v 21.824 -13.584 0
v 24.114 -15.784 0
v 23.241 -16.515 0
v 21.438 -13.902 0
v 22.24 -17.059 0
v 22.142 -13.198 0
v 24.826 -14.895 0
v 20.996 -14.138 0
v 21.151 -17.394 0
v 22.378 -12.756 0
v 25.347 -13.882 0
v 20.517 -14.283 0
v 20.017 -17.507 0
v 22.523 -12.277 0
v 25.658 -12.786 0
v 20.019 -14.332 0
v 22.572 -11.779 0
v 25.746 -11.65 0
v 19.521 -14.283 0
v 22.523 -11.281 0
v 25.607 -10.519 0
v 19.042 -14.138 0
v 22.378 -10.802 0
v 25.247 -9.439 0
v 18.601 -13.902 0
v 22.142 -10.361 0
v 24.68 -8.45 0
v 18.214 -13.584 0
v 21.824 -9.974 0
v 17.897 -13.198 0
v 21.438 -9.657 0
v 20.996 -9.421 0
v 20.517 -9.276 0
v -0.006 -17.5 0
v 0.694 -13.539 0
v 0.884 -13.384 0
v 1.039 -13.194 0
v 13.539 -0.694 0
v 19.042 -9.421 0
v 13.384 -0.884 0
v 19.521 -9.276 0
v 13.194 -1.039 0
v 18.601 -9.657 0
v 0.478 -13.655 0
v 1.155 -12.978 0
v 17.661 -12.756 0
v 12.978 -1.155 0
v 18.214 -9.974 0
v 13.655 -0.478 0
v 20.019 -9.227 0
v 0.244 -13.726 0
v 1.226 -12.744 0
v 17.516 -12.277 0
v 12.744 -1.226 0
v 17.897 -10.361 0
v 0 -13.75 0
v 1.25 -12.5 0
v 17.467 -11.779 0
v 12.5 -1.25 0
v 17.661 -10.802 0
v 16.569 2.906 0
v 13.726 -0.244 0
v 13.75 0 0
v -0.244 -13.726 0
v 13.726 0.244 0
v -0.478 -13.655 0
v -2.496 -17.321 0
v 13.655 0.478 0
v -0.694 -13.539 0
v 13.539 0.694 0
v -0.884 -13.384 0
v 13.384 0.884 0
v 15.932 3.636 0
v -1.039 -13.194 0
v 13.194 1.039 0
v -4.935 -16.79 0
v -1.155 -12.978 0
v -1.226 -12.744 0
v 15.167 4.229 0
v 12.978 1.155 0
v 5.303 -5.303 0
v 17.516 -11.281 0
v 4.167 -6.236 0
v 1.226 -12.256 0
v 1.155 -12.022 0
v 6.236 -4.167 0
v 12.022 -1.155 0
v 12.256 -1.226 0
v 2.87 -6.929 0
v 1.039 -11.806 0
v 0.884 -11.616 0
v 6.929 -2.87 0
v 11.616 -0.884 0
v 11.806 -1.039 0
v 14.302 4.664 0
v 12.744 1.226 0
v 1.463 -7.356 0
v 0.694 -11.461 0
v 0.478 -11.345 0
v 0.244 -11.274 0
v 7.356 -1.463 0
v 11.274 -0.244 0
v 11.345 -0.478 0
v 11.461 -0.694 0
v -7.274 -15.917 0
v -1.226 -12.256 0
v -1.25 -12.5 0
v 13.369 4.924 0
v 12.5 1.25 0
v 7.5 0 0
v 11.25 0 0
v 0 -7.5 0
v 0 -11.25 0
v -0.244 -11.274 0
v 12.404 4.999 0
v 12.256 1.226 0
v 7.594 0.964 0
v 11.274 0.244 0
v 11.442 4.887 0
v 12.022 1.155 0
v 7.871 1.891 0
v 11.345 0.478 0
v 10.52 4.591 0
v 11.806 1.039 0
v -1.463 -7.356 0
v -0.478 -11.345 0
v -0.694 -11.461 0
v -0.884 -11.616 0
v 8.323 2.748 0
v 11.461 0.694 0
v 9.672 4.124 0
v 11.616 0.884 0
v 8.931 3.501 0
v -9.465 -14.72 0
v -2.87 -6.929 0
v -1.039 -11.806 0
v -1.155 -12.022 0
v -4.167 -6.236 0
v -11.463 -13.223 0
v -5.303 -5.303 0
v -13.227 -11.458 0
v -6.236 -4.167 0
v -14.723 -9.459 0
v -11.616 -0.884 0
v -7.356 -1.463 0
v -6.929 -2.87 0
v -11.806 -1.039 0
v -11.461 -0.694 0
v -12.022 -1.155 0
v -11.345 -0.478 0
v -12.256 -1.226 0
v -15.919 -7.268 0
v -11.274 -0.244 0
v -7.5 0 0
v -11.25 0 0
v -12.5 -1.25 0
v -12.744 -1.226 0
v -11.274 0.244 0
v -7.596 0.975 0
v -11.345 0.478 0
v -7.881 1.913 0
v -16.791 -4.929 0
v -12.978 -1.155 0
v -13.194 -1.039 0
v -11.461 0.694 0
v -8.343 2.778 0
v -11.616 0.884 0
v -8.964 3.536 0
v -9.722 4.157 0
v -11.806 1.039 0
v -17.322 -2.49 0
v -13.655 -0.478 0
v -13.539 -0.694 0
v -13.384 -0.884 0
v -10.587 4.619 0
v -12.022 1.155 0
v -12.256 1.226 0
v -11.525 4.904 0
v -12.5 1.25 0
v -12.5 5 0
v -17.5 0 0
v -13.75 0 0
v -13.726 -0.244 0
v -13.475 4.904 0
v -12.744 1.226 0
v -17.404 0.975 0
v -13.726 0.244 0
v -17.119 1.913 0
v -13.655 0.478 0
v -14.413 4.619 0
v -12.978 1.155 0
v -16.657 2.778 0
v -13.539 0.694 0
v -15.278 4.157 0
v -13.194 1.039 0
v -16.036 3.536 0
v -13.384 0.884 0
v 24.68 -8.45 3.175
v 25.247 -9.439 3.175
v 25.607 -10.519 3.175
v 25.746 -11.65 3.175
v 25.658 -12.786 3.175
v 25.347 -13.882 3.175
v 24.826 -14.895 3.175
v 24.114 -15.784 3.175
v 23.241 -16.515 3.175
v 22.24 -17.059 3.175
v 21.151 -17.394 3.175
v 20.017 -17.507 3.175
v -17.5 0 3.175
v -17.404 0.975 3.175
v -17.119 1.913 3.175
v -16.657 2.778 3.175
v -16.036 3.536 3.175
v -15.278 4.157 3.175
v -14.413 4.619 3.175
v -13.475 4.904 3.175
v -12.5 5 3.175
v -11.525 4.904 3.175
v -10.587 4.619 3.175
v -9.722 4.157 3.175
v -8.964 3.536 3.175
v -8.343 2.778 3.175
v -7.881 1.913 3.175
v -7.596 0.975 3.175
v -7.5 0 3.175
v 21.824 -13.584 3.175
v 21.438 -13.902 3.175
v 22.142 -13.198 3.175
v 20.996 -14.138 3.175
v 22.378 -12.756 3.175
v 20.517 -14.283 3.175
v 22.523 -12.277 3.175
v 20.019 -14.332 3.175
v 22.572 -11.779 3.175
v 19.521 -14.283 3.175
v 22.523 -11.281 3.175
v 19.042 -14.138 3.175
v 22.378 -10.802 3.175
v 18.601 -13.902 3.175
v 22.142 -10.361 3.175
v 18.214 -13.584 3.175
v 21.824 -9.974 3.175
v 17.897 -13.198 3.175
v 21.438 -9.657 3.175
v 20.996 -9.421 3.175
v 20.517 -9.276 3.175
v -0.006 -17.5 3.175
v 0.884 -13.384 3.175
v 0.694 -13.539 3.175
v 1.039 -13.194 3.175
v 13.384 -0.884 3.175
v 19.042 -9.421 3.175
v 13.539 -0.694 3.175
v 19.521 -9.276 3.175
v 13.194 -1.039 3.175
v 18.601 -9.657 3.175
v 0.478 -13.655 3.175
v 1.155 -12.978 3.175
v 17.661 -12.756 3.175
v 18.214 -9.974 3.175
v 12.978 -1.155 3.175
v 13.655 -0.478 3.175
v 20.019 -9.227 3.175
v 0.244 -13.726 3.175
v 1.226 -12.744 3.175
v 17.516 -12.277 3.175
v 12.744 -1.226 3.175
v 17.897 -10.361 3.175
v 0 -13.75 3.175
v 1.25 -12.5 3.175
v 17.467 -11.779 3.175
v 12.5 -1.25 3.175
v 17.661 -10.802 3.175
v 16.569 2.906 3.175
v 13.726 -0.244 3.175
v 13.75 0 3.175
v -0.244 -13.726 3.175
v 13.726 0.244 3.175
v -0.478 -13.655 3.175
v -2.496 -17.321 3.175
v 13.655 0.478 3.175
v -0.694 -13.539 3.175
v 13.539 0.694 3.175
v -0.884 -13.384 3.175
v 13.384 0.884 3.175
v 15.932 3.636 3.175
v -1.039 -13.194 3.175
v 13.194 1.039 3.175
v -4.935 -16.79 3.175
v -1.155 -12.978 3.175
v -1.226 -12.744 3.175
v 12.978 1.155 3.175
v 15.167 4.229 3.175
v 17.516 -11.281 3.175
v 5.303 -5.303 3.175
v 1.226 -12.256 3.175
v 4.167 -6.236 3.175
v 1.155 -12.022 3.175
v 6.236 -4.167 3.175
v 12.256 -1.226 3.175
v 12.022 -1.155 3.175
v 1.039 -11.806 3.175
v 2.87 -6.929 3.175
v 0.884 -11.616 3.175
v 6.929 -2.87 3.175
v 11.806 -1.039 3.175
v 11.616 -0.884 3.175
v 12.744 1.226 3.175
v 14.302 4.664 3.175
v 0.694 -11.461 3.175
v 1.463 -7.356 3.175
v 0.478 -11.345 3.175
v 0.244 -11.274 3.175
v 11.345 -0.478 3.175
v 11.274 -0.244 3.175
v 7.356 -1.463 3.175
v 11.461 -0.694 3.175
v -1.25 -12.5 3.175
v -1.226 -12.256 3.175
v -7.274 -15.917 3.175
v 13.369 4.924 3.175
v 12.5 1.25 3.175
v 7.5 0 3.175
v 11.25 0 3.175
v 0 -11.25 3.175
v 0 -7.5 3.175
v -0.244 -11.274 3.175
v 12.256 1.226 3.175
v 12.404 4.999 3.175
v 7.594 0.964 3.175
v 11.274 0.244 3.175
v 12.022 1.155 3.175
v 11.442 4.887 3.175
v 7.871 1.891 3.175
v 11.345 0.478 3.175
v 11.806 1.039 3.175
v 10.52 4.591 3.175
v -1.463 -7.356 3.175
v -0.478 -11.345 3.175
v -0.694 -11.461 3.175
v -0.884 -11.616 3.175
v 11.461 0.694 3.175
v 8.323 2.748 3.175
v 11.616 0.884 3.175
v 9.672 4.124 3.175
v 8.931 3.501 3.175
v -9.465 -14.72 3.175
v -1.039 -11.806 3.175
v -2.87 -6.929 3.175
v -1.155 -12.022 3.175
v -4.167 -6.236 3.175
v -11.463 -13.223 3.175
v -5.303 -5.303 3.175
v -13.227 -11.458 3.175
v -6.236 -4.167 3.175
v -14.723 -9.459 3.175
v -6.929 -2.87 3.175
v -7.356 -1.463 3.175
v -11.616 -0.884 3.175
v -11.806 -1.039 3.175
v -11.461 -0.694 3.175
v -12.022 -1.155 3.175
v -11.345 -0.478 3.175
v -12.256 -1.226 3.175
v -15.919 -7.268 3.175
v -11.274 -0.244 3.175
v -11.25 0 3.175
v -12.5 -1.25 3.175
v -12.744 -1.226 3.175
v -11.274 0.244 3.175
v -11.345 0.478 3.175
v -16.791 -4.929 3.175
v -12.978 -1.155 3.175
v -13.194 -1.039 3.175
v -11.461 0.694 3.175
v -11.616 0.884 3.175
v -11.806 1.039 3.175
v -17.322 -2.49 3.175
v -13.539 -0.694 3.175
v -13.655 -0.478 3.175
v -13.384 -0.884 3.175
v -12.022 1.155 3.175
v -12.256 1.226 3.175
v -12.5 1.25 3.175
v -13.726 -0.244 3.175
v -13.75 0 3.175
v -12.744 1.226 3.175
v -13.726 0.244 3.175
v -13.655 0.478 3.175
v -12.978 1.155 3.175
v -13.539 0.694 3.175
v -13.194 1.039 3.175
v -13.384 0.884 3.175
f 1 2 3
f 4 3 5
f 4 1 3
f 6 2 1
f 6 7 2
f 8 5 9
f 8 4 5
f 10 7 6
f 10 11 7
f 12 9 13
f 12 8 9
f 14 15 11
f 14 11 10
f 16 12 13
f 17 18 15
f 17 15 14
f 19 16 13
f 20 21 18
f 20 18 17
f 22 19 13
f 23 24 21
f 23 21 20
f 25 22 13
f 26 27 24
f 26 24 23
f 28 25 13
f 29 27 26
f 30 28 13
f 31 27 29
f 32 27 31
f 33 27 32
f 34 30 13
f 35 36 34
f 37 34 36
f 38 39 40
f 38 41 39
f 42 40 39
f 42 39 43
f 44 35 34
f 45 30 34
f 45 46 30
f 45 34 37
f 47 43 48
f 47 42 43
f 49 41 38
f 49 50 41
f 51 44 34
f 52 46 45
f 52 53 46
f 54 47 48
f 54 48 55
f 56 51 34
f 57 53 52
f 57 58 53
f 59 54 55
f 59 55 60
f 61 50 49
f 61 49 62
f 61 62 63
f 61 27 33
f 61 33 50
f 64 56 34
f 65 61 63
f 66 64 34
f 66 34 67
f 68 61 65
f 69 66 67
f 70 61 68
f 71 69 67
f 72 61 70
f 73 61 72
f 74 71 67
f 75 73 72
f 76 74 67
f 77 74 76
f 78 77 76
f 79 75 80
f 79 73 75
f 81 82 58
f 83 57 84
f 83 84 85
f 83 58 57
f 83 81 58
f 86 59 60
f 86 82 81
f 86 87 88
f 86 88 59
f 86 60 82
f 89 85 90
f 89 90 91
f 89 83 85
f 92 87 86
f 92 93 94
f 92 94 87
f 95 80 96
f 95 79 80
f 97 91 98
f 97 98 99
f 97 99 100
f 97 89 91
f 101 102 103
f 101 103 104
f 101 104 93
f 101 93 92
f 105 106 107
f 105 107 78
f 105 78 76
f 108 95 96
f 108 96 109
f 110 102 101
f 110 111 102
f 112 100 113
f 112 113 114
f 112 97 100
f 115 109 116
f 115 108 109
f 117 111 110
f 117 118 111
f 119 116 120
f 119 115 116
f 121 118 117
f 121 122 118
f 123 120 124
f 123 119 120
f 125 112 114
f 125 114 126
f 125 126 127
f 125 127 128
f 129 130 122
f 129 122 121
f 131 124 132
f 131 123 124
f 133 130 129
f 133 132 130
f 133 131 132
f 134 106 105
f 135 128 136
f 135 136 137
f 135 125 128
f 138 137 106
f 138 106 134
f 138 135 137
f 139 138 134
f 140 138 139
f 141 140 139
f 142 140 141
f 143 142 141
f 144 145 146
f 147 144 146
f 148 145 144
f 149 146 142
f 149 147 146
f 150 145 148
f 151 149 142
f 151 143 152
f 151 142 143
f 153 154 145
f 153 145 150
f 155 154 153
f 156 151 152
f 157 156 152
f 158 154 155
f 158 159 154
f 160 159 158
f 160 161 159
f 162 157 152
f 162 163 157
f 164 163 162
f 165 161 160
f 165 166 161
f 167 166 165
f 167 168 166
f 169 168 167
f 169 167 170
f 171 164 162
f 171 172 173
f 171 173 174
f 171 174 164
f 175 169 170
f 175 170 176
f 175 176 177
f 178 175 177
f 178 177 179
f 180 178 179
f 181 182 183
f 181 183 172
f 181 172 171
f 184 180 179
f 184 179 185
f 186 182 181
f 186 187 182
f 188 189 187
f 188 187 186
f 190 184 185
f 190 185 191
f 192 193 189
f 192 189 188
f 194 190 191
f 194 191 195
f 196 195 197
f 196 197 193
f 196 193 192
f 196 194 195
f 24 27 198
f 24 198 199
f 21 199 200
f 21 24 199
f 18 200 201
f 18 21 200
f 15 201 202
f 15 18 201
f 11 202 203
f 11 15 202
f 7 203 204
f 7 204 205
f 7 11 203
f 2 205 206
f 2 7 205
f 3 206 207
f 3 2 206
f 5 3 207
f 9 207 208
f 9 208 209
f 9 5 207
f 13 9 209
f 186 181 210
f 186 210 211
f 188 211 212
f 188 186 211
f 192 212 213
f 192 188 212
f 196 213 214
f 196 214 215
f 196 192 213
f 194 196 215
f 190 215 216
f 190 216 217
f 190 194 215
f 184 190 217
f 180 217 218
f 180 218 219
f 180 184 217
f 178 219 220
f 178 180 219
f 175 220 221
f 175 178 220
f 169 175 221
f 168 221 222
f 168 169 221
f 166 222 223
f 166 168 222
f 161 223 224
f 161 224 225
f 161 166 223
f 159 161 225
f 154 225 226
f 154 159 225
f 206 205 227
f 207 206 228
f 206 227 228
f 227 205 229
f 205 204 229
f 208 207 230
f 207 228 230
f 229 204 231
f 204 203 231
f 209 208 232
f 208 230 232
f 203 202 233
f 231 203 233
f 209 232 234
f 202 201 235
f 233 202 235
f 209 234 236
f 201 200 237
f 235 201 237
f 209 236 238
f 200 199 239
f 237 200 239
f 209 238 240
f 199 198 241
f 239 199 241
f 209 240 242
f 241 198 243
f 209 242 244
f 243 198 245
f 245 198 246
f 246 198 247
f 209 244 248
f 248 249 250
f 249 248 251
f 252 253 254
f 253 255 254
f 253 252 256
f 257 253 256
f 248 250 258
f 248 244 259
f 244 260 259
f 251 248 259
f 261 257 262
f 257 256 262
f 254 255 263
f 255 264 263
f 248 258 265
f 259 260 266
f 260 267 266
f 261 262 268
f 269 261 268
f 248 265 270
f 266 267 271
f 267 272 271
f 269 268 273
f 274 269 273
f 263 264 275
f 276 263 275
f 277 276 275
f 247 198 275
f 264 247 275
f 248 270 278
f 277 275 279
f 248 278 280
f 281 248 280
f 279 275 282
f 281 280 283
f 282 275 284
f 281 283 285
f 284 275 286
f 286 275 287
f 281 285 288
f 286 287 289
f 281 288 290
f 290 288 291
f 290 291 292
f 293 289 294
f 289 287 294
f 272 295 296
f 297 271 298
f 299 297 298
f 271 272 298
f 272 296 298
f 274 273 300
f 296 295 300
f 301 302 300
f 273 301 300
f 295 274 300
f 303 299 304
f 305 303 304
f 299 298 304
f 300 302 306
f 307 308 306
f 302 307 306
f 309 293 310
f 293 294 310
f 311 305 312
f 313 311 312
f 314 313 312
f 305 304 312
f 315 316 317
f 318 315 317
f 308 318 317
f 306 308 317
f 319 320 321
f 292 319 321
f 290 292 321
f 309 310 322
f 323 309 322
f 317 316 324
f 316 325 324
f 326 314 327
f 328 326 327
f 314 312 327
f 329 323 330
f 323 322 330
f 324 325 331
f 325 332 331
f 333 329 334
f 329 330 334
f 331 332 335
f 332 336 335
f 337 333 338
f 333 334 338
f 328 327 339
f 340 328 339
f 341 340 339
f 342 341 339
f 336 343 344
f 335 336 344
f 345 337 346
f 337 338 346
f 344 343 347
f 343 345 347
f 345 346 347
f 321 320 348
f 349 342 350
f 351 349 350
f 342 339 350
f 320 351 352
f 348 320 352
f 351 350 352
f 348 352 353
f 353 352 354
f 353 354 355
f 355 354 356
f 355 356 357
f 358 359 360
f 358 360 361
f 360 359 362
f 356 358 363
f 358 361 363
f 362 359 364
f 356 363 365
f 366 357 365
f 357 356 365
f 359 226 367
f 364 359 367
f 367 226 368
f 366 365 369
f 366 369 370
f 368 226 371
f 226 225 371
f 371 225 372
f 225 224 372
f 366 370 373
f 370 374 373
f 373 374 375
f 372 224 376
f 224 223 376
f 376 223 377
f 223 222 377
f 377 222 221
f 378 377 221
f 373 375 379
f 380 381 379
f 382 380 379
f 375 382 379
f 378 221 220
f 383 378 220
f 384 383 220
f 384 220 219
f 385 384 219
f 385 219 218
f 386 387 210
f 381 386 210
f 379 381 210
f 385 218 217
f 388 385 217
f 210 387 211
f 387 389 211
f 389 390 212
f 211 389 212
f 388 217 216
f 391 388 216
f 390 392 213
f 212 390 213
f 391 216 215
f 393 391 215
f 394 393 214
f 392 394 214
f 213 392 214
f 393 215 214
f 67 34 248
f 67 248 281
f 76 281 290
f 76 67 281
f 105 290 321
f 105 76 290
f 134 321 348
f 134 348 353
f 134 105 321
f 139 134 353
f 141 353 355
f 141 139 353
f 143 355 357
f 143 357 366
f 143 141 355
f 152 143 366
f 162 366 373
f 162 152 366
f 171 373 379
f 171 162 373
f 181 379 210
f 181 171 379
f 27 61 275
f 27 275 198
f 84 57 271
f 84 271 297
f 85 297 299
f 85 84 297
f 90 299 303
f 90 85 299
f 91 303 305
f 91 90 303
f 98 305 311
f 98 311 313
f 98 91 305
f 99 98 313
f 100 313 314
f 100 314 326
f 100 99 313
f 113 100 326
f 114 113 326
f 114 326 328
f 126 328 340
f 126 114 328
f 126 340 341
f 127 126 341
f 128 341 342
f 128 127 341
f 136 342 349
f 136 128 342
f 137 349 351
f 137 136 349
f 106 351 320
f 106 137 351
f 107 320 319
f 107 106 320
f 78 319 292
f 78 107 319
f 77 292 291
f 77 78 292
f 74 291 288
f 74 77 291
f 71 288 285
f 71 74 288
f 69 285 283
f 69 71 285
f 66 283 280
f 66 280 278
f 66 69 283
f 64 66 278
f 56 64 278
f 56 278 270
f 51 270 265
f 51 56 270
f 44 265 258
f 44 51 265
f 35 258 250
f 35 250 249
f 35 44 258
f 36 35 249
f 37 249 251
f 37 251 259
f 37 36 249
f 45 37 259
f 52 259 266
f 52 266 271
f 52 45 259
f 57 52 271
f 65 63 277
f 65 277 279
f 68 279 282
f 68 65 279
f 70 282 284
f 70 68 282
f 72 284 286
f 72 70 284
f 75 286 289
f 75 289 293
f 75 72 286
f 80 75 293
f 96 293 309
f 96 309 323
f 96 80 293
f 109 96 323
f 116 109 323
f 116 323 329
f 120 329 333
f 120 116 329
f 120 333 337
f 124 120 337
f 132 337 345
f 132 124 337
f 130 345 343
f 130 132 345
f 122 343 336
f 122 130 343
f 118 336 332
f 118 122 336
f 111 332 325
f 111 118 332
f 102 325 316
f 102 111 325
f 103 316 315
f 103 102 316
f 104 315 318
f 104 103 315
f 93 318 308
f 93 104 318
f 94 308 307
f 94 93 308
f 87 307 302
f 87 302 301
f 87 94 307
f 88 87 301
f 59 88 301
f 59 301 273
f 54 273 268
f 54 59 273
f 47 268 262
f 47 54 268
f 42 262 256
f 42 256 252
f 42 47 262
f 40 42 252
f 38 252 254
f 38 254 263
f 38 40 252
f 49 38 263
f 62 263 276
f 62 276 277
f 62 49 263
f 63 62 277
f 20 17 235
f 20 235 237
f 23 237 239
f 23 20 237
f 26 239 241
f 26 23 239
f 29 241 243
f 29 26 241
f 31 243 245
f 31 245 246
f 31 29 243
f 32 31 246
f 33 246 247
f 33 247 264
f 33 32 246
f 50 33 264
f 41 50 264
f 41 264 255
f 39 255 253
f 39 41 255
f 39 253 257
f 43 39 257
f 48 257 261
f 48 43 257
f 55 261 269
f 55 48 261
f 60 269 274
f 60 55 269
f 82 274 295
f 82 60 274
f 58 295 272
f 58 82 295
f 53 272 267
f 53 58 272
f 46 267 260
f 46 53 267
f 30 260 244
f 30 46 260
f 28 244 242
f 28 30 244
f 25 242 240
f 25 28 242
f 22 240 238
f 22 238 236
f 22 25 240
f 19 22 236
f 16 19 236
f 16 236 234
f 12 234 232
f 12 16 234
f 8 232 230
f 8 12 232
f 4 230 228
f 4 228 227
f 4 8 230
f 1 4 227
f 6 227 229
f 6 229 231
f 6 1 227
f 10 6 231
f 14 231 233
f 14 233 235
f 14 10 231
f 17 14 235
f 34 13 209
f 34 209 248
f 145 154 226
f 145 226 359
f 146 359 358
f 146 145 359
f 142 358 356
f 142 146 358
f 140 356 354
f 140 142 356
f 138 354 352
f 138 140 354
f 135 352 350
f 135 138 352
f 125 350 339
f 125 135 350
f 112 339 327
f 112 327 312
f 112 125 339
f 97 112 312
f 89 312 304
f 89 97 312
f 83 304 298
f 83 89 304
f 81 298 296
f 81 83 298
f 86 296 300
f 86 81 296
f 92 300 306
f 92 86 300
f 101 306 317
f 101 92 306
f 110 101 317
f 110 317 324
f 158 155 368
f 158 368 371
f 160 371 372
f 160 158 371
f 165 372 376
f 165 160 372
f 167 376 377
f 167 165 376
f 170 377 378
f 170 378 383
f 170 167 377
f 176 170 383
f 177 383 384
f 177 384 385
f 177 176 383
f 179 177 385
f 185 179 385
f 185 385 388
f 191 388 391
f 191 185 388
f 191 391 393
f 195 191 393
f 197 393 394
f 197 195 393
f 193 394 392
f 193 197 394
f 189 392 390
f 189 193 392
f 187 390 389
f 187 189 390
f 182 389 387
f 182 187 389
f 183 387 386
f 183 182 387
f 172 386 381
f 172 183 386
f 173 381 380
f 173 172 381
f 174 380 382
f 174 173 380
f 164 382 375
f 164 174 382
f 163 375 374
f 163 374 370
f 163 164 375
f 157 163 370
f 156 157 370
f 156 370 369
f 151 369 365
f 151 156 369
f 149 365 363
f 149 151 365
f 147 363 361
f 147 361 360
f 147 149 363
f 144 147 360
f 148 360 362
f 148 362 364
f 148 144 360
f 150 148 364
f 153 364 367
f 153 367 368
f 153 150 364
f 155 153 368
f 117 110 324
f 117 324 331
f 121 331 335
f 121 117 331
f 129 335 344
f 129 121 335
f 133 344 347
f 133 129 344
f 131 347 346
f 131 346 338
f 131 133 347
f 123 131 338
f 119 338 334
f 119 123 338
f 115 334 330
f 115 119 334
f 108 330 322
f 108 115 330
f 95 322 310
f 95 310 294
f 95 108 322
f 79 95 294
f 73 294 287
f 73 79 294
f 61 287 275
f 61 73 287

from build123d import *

# Parameters (mm, degrees)
SKETCH1_R           = 1.25
SKETCH1_R_2         = 2.5527
BOSS_EXTRUDE1_DEPTH = 3.175


with BuildPart() as part:
    # Sketch1 → Boss-Extrude1 (new body)
    with BuildSketch(Plane.XY):
        with BuildLine():
            Line((16.568712632, 2.906127581), (24.680172581, -8.450290414))
            ThreePointArc((24.680172581, -8.450290414), (25.11170139, -14.401205395), (20.017275273, -17.507075445))
            Line((20.017275273, -17.507075445), (-0.006184716, -17.499998907))
            ThreePointArc((-0.006184716, -17.499998907), (-12.376555105, -12.37218185), (-17.5, 0))
            ThreePointArc((-17.5, 0), (-12.5, 5), (-7.5, 0))
            ThreePointArc((-7.5, 0), (0, -7.5), (7.5, 0))
            ThreePointArc((7.5, 0), (10.974149935, 4.761489429), (16.568712632, 2.906127581))
        make_face()
        with Locations((12.5, 0)):
            Circle(SKETCH1_R, mode=Mode.SUBTRACT)
        with Locations((0, -12.5)):
            Circle(SKETCH1_R, mode=Mode.SUBTRACT)
        with Locations((-12.5, 0)):
            Circle(SKETCH1_R, mode=Mode.SUBTRACT)
        with Locations((20.019299513, -11.779375803)):
            Circle(SKETCH1_R_2, mode=Mode.SUBTRACT)
    extrude(amount=BOSS_EXTRUDE1_DEPTH)


solid = part.part
